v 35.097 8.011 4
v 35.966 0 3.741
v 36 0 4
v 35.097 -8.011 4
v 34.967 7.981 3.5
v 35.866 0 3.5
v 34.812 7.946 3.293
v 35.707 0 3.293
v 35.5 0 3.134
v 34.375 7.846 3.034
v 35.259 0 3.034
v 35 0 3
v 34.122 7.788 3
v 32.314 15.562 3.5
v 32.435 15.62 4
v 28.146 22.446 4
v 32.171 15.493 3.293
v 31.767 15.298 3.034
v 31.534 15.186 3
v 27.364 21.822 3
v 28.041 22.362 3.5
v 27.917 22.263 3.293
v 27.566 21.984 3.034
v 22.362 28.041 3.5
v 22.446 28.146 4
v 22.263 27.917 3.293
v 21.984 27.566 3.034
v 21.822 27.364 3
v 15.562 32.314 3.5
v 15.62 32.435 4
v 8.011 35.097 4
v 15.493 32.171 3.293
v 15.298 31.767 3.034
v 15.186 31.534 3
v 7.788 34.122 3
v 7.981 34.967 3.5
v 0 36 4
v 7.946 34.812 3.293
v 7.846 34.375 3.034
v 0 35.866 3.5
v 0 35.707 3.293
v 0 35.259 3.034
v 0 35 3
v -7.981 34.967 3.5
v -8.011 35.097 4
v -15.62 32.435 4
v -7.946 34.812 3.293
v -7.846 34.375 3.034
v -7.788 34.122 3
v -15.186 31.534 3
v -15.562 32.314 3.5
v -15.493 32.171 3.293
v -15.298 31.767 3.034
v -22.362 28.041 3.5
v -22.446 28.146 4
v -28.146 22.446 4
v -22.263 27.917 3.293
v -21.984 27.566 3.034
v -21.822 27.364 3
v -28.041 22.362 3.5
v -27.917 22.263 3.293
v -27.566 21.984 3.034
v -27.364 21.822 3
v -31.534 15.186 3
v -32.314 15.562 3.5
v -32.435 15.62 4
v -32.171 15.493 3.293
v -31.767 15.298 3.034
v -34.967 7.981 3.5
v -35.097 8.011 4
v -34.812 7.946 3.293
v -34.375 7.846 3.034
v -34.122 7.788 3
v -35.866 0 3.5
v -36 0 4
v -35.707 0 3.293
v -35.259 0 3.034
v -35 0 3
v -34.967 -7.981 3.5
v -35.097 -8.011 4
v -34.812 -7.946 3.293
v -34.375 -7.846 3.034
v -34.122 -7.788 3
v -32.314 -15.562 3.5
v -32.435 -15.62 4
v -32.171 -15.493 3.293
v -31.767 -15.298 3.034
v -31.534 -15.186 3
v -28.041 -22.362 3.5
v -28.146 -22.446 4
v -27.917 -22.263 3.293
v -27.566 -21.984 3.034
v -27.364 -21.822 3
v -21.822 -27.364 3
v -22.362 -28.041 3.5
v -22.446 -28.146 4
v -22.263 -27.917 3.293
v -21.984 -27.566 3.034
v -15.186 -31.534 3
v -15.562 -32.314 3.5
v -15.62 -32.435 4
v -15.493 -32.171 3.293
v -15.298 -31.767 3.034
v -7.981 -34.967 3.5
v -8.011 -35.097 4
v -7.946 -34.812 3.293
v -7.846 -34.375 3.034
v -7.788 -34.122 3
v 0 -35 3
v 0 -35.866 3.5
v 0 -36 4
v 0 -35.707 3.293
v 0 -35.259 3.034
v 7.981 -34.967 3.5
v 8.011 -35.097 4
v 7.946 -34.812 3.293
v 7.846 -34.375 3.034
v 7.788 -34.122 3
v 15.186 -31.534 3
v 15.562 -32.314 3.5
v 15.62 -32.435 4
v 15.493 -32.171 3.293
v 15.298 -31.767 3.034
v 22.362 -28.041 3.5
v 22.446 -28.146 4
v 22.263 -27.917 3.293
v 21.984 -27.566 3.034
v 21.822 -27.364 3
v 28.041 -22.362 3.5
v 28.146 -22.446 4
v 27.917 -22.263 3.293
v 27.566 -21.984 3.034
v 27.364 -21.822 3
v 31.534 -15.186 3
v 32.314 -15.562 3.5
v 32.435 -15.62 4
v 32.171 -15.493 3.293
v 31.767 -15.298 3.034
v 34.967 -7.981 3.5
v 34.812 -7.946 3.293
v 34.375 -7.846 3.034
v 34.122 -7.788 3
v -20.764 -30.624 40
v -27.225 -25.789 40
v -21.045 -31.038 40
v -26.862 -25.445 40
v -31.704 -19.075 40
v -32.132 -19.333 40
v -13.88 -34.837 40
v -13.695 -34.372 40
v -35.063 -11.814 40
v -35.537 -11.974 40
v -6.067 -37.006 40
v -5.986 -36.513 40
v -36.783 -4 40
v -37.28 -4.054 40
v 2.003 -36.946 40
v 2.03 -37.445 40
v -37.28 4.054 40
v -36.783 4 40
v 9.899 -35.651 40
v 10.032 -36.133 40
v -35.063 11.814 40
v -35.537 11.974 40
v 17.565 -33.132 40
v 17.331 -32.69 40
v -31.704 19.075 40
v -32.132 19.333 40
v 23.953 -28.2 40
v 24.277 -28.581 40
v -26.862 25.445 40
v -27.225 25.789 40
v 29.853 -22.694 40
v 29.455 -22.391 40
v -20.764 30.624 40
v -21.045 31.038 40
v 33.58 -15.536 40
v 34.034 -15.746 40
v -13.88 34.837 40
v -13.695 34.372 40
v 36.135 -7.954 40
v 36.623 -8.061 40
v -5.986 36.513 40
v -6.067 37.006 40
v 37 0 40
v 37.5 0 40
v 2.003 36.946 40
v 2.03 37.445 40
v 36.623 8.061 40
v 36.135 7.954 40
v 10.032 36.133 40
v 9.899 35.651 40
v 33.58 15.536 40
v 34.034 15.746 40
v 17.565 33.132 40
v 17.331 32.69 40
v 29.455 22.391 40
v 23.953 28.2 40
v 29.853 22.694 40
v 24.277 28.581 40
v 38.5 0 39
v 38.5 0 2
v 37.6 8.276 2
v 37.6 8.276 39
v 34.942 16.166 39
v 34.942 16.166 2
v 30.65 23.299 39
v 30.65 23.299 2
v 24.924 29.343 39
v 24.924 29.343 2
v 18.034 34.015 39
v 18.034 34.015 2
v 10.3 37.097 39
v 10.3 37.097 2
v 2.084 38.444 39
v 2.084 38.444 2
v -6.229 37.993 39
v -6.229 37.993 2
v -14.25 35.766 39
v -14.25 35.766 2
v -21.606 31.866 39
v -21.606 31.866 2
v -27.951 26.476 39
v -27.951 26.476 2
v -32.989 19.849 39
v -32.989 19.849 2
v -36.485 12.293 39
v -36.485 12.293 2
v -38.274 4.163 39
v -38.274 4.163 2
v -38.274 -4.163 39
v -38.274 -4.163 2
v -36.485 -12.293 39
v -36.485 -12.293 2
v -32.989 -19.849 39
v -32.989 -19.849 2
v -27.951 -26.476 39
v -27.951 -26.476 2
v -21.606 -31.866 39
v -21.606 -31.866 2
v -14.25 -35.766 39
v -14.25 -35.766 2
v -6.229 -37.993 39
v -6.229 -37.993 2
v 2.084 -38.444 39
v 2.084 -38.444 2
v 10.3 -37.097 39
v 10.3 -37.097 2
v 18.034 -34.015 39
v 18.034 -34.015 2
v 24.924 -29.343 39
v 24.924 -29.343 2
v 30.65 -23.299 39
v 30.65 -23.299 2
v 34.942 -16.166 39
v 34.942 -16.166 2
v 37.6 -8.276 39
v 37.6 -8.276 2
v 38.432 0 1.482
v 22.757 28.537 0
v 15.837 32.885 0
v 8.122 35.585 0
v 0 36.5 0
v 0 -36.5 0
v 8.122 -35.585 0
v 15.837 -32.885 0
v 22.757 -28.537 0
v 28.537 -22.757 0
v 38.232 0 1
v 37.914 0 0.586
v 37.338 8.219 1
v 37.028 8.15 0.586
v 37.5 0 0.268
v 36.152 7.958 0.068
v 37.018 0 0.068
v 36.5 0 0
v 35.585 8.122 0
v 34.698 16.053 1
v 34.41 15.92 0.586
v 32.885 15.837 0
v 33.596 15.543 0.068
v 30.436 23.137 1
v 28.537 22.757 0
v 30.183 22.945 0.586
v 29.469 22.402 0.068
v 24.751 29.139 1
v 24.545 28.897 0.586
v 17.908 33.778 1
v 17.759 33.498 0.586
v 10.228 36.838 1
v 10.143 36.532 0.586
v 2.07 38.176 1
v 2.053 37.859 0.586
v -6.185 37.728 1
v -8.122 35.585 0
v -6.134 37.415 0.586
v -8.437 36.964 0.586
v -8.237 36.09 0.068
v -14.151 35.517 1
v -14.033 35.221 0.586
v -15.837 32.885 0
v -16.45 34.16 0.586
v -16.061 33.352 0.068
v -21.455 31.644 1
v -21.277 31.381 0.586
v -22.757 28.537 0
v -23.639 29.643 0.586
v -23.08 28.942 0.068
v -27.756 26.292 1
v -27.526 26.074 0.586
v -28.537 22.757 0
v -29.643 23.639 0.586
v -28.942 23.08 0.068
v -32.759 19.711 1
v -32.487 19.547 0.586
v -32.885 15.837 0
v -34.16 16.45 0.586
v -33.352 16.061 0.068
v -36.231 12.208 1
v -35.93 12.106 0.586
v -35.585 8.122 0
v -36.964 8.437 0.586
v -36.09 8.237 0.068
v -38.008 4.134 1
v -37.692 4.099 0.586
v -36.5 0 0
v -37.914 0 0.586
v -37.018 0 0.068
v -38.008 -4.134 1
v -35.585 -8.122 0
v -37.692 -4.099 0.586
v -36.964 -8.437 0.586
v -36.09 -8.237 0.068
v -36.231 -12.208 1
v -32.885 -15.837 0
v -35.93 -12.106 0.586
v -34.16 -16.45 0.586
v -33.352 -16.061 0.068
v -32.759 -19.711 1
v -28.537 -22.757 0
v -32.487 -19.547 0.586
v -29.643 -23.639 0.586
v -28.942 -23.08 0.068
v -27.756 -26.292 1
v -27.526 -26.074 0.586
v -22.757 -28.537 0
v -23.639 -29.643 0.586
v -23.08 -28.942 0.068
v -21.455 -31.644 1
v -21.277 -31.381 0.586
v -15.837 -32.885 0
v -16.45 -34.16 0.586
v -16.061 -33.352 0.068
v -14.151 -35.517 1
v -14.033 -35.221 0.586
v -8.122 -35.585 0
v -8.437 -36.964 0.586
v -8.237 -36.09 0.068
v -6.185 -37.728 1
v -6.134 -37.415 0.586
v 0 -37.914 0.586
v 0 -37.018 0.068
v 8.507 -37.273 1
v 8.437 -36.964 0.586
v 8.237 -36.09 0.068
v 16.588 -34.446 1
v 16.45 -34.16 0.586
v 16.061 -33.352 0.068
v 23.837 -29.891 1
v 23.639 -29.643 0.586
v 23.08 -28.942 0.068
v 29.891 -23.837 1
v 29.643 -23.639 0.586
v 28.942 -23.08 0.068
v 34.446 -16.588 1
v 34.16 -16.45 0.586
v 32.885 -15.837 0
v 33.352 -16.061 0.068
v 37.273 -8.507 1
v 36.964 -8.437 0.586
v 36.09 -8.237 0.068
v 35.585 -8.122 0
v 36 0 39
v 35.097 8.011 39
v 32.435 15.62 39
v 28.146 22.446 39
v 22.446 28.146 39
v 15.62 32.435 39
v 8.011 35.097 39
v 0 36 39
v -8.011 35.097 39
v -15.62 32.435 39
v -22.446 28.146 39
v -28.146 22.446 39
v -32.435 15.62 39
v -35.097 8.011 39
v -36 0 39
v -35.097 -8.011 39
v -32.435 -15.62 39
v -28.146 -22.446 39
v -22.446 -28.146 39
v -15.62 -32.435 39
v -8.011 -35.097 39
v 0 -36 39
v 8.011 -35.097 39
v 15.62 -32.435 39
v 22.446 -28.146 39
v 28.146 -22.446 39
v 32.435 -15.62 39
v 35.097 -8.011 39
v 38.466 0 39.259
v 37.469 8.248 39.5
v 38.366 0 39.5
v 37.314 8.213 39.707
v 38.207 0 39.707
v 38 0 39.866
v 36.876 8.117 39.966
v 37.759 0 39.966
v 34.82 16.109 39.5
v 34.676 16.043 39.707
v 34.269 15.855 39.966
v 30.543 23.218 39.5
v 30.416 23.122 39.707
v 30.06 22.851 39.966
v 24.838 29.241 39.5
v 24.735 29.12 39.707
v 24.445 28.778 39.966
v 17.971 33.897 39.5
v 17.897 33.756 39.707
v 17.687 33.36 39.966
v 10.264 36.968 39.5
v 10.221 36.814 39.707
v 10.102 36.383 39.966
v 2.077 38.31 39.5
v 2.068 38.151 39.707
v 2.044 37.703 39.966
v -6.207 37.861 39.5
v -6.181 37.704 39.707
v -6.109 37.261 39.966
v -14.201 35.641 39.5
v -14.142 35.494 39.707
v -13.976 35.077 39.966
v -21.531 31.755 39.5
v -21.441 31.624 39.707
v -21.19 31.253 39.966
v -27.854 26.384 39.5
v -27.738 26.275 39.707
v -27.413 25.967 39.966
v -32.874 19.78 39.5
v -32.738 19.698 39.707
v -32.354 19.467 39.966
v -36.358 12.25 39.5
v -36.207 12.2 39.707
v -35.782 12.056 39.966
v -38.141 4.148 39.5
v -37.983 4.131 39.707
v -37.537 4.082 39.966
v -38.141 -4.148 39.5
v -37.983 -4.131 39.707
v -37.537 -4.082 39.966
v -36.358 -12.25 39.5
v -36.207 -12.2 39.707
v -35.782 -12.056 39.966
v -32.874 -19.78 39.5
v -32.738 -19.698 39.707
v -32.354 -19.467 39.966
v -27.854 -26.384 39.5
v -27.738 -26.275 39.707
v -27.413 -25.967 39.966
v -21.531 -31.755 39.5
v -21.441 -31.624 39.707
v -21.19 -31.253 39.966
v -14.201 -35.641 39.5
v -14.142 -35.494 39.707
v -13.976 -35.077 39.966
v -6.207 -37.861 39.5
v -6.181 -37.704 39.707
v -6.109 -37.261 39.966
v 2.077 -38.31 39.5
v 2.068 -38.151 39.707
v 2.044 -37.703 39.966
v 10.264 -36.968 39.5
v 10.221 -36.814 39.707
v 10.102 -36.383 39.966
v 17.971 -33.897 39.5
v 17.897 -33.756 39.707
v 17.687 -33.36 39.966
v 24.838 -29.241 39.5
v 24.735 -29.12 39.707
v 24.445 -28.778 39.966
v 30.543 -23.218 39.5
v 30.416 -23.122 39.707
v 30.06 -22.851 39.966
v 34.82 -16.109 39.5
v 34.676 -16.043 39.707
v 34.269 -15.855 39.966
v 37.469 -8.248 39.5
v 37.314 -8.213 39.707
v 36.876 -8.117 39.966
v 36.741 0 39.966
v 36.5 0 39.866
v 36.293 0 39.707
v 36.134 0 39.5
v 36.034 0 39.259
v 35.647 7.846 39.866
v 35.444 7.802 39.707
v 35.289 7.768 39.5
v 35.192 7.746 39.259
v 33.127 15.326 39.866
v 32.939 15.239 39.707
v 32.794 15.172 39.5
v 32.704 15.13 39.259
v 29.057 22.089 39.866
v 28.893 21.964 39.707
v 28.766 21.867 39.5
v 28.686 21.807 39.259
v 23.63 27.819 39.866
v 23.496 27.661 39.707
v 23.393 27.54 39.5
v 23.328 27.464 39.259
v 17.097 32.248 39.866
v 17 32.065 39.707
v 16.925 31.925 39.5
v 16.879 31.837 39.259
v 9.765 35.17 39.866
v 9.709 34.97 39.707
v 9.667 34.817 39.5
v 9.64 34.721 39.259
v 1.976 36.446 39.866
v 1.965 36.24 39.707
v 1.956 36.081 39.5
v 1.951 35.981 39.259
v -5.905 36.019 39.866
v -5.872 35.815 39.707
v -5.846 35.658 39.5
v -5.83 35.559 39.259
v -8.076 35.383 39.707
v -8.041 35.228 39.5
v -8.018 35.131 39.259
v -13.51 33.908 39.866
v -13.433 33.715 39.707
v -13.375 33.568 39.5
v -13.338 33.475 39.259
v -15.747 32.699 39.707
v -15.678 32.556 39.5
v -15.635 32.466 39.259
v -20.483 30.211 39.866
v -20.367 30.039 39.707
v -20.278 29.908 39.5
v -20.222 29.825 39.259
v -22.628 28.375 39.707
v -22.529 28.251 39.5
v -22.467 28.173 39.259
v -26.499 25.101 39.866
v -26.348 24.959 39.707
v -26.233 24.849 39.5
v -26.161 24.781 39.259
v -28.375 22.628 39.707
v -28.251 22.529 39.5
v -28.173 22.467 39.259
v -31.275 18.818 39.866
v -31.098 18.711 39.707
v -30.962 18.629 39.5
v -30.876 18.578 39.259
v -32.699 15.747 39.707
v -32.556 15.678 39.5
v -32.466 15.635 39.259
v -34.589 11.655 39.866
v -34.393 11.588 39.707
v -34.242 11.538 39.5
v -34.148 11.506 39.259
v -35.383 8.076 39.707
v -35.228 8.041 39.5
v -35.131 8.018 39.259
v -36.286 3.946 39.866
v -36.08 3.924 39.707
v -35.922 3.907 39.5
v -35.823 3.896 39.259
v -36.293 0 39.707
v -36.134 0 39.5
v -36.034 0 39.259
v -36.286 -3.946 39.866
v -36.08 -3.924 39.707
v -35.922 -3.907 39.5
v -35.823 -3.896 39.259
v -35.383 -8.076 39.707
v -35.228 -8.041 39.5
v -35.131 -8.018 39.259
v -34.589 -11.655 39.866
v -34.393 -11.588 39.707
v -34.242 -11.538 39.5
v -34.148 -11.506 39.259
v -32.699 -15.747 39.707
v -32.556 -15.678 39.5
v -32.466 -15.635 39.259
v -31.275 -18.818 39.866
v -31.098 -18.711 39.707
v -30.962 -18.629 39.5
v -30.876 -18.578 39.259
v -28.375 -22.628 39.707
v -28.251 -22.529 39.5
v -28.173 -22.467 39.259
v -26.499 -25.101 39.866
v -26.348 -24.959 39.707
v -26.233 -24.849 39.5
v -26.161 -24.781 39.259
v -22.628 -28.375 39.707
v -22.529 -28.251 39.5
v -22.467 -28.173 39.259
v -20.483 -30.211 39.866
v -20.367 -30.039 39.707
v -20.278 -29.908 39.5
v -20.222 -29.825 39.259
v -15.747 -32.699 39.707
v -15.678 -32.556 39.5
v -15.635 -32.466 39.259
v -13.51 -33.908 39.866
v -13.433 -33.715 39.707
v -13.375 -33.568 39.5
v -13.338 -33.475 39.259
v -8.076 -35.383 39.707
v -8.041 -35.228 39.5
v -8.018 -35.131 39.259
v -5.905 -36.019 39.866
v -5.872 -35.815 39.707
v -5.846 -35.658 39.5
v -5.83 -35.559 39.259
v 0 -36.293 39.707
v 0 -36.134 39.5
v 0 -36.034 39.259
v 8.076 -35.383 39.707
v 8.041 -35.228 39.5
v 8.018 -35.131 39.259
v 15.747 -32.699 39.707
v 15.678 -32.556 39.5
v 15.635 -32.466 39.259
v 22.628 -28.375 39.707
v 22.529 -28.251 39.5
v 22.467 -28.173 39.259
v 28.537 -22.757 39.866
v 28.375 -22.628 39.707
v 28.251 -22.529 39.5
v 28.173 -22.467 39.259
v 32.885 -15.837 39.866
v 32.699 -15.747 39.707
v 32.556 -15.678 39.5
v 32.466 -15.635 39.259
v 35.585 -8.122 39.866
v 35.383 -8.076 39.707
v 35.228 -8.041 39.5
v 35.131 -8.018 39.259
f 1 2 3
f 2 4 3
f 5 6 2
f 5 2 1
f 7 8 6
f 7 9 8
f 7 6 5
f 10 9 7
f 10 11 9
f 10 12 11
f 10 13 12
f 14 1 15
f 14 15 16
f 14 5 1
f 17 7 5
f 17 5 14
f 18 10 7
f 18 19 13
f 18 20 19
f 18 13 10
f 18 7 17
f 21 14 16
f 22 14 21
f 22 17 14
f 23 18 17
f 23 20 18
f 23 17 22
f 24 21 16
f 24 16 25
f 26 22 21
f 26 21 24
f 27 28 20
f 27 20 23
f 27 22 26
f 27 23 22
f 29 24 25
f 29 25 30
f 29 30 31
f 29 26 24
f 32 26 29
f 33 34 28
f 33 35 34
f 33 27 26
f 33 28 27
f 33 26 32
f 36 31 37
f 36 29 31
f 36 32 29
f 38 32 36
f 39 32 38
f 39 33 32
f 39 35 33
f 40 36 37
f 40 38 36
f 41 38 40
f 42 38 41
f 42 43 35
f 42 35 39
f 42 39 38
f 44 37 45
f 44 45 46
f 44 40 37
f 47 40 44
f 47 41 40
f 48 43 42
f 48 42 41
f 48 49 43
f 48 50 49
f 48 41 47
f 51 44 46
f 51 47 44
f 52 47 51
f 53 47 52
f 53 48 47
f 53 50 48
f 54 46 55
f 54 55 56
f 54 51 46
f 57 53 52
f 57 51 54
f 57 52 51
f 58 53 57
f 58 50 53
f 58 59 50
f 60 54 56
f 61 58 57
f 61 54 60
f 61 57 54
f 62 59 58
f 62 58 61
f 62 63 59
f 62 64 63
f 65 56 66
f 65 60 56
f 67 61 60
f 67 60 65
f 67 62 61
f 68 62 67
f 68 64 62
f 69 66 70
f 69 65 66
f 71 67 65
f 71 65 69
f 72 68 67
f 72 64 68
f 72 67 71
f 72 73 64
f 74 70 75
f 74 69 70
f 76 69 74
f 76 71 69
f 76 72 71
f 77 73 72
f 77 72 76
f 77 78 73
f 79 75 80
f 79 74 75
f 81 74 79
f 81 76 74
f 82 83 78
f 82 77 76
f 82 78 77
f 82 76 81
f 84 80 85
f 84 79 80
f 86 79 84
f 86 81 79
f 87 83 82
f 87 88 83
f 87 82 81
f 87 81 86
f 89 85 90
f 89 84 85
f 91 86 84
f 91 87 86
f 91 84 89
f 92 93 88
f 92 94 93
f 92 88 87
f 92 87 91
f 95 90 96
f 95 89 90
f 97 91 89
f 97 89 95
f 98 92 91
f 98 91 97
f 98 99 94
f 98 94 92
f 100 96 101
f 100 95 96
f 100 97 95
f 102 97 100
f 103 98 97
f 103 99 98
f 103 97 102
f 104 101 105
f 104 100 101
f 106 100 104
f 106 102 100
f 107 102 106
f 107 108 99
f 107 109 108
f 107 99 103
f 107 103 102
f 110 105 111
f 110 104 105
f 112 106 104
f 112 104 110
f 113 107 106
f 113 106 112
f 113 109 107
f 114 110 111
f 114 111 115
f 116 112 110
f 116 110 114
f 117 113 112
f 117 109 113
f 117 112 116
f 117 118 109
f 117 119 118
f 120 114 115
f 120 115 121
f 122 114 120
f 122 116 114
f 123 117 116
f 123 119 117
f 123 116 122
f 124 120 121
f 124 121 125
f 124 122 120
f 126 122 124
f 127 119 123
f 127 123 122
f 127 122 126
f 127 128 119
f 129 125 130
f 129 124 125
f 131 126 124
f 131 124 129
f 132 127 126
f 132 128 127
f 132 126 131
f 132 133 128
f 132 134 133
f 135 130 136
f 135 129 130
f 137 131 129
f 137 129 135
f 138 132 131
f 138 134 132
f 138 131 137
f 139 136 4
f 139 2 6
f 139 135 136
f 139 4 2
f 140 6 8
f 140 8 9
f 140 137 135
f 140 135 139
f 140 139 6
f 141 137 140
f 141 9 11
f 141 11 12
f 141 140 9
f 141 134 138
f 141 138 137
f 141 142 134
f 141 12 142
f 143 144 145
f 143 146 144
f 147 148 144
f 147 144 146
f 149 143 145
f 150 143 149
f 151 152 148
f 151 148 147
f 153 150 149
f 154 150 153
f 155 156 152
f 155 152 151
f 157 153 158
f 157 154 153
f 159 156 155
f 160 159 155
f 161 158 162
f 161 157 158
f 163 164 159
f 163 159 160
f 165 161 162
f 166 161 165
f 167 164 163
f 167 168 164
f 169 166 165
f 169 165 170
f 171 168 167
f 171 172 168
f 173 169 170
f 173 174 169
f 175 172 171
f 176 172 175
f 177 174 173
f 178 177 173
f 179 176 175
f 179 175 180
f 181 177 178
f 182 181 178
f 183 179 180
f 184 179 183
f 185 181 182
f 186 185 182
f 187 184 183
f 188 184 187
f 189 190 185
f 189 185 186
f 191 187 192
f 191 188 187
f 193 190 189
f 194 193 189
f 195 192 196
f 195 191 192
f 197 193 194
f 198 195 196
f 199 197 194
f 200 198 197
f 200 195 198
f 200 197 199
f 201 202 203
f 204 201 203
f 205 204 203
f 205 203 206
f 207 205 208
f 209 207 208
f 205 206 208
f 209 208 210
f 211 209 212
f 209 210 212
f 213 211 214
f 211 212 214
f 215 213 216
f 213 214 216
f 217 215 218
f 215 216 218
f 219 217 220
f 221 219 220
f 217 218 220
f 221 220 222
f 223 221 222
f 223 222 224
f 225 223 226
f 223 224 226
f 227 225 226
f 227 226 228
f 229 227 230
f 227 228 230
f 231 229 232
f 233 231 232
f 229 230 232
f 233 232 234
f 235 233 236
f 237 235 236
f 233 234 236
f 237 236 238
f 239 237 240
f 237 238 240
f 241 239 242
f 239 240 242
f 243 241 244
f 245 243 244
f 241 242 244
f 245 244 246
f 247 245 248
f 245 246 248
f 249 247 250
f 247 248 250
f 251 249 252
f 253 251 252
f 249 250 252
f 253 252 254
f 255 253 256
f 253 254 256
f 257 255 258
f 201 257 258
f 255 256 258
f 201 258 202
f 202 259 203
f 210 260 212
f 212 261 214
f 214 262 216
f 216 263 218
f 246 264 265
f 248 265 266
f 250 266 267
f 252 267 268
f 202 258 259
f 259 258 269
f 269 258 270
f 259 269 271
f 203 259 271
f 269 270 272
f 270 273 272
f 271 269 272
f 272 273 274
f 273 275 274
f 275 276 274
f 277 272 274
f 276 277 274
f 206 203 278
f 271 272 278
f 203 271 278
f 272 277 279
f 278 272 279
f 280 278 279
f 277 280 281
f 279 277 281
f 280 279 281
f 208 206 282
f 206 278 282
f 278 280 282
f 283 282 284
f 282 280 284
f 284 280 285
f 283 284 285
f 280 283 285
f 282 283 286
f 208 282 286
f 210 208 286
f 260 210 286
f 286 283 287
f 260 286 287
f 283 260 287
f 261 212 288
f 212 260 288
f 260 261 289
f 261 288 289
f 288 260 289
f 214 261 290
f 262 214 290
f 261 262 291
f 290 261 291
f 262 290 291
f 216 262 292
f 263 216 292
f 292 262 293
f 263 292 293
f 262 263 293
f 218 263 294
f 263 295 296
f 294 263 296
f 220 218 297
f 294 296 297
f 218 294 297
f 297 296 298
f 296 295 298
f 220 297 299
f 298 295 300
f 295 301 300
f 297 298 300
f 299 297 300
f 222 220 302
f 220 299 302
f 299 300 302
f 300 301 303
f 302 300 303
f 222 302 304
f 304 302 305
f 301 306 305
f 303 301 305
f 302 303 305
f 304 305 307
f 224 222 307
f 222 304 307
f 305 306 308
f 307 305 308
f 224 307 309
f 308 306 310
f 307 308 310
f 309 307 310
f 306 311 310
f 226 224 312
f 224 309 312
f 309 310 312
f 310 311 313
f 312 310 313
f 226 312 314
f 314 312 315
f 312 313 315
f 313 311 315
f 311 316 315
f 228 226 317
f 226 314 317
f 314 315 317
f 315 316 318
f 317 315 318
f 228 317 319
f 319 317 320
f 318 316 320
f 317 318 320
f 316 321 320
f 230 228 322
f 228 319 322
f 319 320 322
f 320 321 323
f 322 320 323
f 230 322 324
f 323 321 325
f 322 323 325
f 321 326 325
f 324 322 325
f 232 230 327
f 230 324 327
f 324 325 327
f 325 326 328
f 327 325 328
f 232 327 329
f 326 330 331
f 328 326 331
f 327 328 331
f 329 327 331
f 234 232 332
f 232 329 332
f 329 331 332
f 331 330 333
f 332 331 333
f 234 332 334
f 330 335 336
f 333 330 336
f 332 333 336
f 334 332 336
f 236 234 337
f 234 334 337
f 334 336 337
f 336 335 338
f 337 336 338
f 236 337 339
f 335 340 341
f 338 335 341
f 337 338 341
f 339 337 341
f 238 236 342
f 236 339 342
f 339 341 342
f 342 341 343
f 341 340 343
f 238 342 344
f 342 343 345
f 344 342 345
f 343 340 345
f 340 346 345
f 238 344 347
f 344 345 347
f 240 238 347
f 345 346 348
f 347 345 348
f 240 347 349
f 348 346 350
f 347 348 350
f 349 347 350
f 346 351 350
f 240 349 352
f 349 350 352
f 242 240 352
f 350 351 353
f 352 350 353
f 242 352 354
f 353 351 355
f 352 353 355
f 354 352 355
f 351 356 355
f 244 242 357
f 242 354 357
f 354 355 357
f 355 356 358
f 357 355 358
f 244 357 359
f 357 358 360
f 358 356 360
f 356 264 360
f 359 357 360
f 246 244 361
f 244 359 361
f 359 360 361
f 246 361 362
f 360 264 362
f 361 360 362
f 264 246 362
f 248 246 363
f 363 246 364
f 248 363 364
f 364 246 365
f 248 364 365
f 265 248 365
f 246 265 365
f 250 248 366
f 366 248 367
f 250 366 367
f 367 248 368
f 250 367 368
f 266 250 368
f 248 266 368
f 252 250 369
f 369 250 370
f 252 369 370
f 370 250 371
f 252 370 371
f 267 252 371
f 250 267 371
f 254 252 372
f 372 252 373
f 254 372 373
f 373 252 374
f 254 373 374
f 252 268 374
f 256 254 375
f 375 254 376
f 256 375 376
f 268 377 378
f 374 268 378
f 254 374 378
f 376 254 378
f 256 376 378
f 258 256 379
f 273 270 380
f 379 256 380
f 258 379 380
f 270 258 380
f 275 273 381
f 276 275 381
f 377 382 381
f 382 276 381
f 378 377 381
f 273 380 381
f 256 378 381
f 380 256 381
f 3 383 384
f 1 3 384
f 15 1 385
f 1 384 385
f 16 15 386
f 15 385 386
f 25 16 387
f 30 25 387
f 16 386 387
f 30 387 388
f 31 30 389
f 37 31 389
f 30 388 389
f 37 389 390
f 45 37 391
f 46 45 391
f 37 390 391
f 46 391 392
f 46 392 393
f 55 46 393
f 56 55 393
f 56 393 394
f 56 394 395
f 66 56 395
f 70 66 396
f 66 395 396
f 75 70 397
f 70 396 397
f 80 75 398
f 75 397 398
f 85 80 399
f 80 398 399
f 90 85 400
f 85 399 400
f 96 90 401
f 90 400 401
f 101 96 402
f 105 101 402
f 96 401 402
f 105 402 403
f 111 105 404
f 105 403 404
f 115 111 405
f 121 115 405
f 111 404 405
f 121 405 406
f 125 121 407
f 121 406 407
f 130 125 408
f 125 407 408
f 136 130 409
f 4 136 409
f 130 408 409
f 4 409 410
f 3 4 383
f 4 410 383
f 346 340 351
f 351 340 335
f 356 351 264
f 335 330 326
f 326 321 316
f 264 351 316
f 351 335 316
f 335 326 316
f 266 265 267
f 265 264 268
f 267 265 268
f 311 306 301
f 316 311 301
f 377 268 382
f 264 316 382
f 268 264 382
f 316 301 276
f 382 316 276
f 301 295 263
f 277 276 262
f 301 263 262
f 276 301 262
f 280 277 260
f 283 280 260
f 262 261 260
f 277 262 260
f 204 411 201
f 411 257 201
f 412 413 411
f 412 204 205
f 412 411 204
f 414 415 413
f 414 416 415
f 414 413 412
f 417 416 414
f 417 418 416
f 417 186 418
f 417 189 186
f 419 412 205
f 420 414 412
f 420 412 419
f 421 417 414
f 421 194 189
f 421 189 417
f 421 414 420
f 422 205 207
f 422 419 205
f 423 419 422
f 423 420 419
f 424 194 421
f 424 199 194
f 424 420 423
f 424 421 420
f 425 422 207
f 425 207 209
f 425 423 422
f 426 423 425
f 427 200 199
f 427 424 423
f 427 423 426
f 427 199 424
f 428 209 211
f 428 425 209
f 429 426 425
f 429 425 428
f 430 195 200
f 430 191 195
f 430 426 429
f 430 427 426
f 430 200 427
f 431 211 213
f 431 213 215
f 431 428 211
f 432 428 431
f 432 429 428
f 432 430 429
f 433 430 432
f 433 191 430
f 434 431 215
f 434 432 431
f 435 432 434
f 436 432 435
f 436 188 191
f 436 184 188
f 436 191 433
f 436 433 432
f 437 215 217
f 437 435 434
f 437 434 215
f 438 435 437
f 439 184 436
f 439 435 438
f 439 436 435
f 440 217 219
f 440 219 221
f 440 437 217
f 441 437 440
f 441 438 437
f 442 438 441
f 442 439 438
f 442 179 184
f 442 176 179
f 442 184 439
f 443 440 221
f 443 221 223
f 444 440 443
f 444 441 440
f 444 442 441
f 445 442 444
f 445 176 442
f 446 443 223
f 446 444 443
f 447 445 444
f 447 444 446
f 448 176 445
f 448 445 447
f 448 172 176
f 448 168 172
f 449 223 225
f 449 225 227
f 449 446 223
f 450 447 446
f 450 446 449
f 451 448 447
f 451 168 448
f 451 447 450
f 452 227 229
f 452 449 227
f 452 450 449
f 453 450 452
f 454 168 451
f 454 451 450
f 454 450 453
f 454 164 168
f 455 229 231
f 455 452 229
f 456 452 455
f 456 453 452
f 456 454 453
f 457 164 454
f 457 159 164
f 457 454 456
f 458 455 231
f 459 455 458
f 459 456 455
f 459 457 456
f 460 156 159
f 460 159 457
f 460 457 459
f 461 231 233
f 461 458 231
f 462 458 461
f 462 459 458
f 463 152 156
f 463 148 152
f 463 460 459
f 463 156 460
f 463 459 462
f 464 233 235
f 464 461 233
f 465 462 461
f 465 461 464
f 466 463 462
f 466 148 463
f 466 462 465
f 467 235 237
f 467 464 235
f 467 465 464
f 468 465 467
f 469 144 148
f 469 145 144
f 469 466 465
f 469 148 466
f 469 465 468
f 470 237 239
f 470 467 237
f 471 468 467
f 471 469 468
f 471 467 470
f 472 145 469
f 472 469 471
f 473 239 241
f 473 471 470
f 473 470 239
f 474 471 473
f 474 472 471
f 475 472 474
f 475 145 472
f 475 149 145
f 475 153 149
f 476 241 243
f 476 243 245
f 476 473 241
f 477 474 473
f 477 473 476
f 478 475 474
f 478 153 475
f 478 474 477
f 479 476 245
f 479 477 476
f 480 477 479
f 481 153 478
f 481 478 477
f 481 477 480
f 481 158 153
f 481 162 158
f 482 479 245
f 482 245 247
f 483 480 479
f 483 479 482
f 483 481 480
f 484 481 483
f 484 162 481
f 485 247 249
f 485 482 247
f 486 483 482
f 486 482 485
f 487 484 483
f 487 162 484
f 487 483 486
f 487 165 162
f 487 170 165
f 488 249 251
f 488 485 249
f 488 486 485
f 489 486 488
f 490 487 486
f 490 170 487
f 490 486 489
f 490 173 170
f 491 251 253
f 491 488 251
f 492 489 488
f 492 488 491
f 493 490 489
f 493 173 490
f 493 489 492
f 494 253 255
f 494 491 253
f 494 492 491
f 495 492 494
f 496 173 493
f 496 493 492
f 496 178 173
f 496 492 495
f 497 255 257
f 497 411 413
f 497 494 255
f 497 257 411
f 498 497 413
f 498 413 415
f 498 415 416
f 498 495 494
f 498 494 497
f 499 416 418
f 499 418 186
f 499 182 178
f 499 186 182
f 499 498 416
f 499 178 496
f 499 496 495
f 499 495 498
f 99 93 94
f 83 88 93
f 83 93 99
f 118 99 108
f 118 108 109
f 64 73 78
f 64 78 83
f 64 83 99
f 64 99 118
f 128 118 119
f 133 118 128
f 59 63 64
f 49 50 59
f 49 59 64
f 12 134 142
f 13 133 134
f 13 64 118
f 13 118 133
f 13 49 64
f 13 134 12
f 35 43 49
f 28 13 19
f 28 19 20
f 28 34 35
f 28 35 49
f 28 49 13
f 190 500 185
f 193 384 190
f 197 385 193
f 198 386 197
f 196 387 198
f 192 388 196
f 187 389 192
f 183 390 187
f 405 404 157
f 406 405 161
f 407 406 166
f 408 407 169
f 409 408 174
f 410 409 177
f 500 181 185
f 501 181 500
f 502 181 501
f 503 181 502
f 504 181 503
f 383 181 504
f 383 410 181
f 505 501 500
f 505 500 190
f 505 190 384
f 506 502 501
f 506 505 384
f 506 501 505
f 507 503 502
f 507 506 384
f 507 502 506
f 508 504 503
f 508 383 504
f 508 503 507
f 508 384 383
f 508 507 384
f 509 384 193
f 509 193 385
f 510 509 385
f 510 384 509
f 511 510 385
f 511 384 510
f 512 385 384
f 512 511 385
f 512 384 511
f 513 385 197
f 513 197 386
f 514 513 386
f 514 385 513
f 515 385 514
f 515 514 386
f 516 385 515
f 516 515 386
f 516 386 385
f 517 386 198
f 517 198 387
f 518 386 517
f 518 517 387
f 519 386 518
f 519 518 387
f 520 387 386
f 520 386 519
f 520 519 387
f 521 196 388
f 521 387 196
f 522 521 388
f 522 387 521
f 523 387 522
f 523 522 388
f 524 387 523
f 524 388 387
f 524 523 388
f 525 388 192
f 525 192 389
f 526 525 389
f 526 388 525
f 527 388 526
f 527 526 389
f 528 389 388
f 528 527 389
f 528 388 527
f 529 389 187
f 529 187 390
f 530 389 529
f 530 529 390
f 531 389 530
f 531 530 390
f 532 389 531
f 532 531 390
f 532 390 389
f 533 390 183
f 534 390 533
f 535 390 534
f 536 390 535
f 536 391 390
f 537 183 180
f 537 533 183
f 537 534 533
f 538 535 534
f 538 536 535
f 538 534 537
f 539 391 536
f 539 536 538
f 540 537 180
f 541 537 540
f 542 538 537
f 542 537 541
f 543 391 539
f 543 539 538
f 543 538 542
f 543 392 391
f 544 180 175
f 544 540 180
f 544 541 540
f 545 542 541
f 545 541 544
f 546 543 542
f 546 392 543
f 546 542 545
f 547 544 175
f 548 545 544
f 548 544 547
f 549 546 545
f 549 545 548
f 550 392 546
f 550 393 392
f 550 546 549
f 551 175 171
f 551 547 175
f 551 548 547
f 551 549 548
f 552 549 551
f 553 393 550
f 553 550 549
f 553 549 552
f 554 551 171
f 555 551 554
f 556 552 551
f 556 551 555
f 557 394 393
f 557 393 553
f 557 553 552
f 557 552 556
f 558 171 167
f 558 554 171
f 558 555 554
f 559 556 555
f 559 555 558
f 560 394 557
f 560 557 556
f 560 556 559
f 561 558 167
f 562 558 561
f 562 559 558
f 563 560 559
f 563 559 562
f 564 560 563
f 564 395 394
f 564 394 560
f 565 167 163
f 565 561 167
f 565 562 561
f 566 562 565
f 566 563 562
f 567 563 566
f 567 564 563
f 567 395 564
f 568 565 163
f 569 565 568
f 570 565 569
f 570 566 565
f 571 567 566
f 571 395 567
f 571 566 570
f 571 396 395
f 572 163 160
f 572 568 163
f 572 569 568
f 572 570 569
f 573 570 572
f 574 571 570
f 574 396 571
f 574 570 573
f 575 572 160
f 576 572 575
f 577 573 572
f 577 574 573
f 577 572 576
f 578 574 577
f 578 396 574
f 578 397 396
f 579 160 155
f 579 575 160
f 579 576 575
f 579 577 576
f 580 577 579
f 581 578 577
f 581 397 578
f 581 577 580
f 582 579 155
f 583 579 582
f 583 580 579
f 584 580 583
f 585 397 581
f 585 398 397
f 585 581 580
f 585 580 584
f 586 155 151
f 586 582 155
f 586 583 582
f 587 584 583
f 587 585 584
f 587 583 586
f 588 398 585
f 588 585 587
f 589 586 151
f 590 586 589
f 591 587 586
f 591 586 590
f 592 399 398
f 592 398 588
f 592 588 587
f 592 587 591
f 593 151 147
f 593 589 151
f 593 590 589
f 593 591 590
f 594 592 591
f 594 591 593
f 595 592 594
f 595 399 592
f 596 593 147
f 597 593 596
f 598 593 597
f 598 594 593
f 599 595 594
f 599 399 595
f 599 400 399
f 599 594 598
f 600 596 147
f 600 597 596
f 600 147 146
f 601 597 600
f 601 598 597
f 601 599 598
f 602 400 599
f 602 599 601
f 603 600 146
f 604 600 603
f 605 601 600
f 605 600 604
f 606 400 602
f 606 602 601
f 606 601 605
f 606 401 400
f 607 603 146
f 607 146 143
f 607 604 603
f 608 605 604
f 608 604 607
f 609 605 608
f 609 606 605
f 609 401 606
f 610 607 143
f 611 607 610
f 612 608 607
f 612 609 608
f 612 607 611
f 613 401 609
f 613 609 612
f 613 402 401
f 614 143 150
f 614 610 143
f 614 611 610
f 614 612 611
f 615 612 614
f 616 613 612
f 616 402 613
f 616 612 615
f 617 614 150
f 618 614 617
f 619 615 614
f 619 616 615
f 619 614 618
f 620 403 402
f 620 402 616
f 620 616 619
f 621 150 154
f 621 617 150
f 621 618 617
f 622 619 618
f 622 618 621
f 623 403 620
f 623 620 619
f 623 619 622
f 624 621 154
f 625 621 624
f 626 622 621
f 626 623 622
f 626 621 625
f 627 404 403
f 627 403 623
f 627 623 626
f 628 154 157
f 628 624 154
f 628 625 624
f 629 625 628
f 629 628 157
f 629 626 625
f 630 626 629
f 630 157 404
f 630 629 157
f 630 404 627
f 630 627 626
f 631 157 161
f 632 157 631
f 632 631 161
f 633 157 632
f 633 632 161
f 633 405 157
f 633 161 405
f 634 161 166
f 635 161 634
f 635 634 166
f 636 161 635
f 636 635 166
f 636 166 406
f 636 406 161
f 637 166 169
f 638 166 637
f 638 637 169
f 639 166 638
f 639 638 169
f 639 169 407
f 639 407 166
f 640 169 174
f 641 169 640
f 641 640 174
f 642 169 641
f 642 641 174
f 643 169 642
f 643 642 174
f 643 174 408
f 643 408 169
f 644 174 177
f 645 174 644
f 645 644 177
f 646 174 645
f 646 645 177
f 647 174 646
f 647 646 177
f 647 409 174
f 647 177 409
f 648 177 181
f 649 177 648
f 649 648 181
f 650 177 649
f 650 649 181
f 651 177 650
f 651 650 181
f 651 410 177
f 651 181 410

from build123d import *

# Parameters (mm, degrees)
SKETCH_R     = 38.5
PAD_DEPTH    = 40
SKETCH001_R  = 36
POCKET_DEPTH = 37
FILLET_R     = 1
FILLET001_R  = 2
FILLET002_R  = 1


with BuildPart() as part:
    # Sketch → Pad (new body)
    with BuildSketch(Plane.XY):
        Circle(SKETCH_R)
    extrude(amount=PAD_DEPTH)

    # Sketch001 (on Face3 of Pad) → Pocket (cut)
    with BuildSketch(Plane.XY.offset(40)):
        Circle(SKETCH001_R)
    extrude(amount=-POCKET_DEPTH, mode=Mode.SUBTRACT)

    # Fillet
    fillet_edges = [part.edges().sort_by_distance(p)[0] for p in [
        (-38.5, 0, 40),
        (-36, 0, 40),
    ]]
    fillet(fillet_edges, radius=FILLET_R)

    # Fillet001
    fillet001_edges = [part.edges().sort_by_distance(p)[0] for p in [
        (-38.5, 0, 0),
    ]]
    fillet(fillet001_edges, radius=FILLET001_R)

    # Fillet002
    fillet002_edges = [part.edges().sort_by_distance(p)[0] for p in [
        (-36, 0, 3),
    ]]
    fillet(fillet002_edges, radius=FILLET002_R)


solid = part.part
